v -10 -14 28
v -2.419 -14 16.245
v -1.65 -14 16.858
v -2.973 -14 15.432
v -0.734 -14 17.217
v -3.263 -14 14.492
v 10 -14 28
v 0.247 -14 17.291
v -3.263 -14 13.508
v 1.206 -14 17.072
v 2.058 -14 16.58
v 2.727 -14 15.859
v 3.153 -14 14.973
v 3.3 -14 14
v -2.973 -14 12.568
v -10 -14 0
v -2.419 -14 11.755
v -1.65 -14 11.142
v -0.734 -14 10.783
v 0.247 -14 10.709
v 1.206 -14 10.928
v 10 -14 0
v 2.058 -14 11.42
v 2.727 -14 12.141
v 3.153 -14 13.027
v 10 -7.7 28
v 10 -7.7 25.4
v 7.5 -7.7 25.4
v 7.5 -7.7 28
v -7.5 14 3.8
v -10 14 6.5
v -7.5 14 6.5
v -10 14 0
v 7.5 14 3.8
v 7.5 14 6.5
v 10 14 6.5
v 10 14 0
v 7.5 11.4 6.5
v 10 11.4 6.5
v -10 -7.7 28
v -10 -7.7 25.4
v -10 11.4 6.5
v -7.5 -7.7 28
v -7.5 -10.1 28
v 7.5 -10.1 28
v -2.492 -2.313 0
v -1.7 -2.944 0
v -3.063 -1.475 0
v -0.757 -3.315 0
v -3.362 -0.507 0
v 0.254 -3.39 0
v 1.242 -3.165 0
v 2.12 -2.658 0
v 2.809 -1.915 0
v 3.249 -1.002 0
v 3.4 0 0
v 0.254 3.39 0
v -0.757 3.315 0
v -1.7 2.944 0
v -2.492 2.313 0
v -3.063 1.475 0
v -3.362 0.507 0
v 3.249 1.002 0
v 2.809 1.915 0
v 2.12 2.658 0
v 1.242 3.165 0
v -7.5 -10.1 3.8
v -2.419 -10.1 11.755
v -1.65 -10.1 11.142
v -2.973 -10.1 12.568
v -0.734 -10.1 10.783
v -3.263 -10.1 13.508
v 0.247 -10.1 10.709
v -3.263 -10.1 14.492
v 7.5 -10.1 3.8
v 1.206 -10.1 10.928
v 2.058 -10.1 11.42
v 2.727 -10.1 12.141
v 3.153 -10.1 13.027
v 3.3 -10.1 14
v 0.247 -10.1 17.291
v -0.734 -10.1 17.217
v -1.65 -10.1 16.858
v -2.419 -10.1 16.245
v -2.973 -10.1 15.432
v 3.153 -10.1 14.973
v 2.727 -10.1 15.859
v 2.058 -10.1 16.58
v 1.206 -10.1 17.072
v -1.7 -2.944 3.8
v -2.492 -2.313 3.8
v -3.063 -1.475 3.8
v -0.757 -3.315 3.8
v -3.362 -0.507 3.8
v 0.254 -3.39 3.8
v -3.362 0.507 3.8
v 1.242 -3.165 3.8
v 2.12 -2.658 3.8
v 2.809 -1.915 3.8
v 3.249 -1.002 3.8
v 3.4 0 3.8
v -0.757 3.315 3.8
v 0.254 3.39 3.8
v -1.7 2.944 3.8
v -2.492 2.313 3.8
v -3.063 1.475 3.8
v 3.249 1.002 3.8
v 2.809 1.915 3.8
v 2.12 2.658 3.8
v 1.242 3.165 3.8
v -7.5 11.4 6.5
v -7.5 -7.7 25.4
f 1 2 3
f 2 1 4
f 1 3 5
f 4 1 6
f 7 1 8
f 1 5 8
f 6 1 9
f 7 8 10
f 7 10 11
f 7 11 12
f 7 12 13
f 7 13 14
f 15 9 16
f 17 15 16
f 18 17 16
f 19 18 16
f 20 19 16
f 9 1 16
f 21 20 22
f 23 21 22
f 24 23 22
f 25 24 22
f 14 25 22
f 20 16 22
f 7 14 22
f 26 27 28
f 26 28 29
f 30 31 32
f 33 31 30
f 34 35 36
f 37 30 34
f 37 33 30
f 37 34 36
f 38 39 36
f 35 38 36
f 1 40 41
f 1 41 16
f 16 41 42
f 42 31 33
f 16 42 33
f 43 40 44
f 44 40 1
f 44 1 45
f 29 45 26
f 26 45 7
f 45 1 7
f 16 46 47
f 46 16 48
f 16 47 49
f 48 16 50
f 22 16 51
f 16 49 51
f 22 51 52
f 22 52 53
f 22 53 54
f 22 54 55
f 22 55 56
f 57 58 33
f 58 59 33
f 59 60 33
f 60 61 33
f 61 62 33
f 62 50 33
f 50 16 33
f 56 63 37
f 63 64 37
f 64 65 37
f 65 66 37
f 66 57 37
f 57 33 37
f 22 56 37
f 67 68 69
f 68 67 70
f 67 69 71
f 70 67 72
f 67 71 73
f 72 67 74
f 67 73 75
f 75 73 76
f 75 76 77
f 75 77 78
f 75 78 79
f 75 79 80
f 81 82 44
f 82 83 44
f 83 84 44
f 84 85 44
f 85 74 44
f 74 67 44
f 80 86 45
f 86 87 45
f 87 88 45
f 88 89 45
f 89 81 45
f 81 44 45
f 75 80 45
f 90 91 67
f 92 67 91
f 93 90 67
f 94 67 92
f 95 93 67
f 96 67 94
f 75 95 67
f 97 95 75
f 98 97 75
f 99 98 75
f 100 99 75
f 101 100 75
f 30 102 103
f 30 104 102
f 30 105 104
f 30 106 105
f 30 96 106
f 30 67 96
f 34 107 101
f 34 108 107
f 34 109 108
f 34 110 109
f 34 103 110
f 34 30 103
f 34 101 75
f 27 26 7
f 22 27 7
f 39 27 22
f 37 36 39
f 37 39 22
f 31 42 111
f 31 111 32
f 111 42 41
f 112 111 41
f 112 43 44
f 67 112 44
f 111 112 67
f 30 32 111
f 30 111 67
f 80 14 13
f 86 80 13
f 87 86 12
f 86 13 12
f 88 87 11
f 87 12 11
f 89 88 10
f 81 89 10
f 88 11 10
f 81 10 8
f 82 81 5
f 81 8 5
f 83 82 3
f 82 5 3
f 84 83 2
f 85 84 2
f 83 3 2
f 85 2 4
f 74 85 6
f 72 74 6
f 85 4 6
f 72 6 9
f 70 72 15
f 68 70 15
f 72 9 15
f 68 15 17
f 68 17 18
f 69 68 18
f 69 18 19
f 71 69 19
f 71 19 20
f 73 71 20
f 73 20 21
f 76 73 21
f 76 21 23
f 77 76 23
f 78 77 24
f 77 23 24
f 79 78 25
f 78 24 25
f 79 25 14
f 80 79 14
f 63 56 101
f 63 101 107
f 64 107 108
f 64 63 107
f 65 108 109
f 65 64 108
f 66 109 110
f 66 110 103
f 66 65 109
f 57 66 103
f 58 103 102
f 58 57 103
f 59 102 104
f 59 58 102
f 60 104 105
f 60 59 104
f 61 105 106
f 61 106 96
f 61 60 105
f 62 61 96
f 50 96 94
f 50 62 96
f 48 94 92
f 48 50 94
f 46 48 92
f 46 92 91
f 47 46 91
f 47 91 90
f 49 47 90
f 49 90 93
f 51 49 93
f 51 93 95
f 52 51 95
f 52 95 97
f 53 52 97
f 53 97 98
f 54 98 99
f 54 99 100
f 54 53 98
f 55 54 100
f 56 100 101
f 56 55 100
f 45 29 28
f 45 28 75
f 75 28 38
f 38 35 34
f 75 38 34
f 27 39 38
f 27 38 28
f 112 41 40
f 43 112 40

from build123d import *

# Parameters (mm, degrees)
SKETCH1_W           = 20
SKETCH1_H           = 28
SKETCH1_R           = 3.4
BOSS_EXTRUDE1_DEPTH = 3.8
SKETCH2_W           = 20
SKETCH2_H           = 28
SKETCH2_R           = 3.3
BOSS_EXTRUDE2_DEPTH = 3.9
SKETCH3_W           = 6.5
SKETCH3_H           = 24.1
BOSS_EXTRUDE3_DEPTH = 2.5
SKETCH4_W           = 28
SKETCH4_H           = 6.3
BOSS_EXTRUDE4_DEPTH = 2.5
BOSS_EXTRUDE5_DEPTH = 2.5


with BuildPart() as part:
    # Sketch1 → Boss-Extrude1 (new body)
    with BuildSketch(Plane.XY):
        Rectangle(SKETCH1_W, SKETCH1_H)
        Circle(SKETCH1_R, mode=Mode.SUBTRACT)
    extrude(amount=BOSS_EXTRUDE1_DEPTH)

    # Sketch2 → Boss-Extrude2 (add)
    with BuildSketch(Plane.XZ.offset(14)):
        with Locations((0, 14)):
            Rectangle(SKETCH2_W, SKETCH2_H)
        with Locations((0, 14)):
            Circle(SKETCH2_R, mode=Mode.SUBTRACT)
    extrude(amount=-BOSS_EXTRUDE2_DEPTH)

    # Sketch3 → Boss-Extrude3 (add)
    with BuildSketch(Plane.ZY.offset(10)):
        with Locations((3.25, 1.95)):
            Rectangle(SKETCH3_W, SKETCH3_H)
    boss_extrude3 = extrude(amount=-BOSS_EXTRUDE3_DEPTH)

    # Mirror1: Boss-Extrude3 across plane
    add(boss_extrude3.mirror(Plane(origin=(0, 0, 0), x_dir=(0, 0, 1), z_dir=(1, 0, 0))))

    # Sketch4 → Boss-Extrude4 (add)
    with BuildSketch(Plane.ZY.offset(10)):
        with Locations((14, -10.85)):
            Rectangle(SKETCH4_W, SKETCH4_H)
    boss_extrude4 = extrude(amount=-BOSS_EXTRUDE4_DEPTH)

    # Mirror2: Boss-Extrude4 across plane
    add(boss_extrude4.mirror(Plane(origin=(0, 0, 0), x_dir=(0, 0, 1), z_dir=(1, 0, 0))))

    # Sketch5 → Boss-Extrude5 (add)
    with BuildSketch(Plane.ZY.offset(10)):
        Polygon((6.5, 11.4), (25.4, -7.7), (6.5, -7.7), align=None)
    boss_extrude5 = extrude(amount=-BOSS_EXTRUDE5_DEPTH)

    # Mirror3: Boss-Extrude5 across plane
    add(boss_extrude5.mirror(Plane(origin=(0, 0, 0), x_dir=(0, 0, 1), z_dir=(1, 0, 0))))


solid = part.part
